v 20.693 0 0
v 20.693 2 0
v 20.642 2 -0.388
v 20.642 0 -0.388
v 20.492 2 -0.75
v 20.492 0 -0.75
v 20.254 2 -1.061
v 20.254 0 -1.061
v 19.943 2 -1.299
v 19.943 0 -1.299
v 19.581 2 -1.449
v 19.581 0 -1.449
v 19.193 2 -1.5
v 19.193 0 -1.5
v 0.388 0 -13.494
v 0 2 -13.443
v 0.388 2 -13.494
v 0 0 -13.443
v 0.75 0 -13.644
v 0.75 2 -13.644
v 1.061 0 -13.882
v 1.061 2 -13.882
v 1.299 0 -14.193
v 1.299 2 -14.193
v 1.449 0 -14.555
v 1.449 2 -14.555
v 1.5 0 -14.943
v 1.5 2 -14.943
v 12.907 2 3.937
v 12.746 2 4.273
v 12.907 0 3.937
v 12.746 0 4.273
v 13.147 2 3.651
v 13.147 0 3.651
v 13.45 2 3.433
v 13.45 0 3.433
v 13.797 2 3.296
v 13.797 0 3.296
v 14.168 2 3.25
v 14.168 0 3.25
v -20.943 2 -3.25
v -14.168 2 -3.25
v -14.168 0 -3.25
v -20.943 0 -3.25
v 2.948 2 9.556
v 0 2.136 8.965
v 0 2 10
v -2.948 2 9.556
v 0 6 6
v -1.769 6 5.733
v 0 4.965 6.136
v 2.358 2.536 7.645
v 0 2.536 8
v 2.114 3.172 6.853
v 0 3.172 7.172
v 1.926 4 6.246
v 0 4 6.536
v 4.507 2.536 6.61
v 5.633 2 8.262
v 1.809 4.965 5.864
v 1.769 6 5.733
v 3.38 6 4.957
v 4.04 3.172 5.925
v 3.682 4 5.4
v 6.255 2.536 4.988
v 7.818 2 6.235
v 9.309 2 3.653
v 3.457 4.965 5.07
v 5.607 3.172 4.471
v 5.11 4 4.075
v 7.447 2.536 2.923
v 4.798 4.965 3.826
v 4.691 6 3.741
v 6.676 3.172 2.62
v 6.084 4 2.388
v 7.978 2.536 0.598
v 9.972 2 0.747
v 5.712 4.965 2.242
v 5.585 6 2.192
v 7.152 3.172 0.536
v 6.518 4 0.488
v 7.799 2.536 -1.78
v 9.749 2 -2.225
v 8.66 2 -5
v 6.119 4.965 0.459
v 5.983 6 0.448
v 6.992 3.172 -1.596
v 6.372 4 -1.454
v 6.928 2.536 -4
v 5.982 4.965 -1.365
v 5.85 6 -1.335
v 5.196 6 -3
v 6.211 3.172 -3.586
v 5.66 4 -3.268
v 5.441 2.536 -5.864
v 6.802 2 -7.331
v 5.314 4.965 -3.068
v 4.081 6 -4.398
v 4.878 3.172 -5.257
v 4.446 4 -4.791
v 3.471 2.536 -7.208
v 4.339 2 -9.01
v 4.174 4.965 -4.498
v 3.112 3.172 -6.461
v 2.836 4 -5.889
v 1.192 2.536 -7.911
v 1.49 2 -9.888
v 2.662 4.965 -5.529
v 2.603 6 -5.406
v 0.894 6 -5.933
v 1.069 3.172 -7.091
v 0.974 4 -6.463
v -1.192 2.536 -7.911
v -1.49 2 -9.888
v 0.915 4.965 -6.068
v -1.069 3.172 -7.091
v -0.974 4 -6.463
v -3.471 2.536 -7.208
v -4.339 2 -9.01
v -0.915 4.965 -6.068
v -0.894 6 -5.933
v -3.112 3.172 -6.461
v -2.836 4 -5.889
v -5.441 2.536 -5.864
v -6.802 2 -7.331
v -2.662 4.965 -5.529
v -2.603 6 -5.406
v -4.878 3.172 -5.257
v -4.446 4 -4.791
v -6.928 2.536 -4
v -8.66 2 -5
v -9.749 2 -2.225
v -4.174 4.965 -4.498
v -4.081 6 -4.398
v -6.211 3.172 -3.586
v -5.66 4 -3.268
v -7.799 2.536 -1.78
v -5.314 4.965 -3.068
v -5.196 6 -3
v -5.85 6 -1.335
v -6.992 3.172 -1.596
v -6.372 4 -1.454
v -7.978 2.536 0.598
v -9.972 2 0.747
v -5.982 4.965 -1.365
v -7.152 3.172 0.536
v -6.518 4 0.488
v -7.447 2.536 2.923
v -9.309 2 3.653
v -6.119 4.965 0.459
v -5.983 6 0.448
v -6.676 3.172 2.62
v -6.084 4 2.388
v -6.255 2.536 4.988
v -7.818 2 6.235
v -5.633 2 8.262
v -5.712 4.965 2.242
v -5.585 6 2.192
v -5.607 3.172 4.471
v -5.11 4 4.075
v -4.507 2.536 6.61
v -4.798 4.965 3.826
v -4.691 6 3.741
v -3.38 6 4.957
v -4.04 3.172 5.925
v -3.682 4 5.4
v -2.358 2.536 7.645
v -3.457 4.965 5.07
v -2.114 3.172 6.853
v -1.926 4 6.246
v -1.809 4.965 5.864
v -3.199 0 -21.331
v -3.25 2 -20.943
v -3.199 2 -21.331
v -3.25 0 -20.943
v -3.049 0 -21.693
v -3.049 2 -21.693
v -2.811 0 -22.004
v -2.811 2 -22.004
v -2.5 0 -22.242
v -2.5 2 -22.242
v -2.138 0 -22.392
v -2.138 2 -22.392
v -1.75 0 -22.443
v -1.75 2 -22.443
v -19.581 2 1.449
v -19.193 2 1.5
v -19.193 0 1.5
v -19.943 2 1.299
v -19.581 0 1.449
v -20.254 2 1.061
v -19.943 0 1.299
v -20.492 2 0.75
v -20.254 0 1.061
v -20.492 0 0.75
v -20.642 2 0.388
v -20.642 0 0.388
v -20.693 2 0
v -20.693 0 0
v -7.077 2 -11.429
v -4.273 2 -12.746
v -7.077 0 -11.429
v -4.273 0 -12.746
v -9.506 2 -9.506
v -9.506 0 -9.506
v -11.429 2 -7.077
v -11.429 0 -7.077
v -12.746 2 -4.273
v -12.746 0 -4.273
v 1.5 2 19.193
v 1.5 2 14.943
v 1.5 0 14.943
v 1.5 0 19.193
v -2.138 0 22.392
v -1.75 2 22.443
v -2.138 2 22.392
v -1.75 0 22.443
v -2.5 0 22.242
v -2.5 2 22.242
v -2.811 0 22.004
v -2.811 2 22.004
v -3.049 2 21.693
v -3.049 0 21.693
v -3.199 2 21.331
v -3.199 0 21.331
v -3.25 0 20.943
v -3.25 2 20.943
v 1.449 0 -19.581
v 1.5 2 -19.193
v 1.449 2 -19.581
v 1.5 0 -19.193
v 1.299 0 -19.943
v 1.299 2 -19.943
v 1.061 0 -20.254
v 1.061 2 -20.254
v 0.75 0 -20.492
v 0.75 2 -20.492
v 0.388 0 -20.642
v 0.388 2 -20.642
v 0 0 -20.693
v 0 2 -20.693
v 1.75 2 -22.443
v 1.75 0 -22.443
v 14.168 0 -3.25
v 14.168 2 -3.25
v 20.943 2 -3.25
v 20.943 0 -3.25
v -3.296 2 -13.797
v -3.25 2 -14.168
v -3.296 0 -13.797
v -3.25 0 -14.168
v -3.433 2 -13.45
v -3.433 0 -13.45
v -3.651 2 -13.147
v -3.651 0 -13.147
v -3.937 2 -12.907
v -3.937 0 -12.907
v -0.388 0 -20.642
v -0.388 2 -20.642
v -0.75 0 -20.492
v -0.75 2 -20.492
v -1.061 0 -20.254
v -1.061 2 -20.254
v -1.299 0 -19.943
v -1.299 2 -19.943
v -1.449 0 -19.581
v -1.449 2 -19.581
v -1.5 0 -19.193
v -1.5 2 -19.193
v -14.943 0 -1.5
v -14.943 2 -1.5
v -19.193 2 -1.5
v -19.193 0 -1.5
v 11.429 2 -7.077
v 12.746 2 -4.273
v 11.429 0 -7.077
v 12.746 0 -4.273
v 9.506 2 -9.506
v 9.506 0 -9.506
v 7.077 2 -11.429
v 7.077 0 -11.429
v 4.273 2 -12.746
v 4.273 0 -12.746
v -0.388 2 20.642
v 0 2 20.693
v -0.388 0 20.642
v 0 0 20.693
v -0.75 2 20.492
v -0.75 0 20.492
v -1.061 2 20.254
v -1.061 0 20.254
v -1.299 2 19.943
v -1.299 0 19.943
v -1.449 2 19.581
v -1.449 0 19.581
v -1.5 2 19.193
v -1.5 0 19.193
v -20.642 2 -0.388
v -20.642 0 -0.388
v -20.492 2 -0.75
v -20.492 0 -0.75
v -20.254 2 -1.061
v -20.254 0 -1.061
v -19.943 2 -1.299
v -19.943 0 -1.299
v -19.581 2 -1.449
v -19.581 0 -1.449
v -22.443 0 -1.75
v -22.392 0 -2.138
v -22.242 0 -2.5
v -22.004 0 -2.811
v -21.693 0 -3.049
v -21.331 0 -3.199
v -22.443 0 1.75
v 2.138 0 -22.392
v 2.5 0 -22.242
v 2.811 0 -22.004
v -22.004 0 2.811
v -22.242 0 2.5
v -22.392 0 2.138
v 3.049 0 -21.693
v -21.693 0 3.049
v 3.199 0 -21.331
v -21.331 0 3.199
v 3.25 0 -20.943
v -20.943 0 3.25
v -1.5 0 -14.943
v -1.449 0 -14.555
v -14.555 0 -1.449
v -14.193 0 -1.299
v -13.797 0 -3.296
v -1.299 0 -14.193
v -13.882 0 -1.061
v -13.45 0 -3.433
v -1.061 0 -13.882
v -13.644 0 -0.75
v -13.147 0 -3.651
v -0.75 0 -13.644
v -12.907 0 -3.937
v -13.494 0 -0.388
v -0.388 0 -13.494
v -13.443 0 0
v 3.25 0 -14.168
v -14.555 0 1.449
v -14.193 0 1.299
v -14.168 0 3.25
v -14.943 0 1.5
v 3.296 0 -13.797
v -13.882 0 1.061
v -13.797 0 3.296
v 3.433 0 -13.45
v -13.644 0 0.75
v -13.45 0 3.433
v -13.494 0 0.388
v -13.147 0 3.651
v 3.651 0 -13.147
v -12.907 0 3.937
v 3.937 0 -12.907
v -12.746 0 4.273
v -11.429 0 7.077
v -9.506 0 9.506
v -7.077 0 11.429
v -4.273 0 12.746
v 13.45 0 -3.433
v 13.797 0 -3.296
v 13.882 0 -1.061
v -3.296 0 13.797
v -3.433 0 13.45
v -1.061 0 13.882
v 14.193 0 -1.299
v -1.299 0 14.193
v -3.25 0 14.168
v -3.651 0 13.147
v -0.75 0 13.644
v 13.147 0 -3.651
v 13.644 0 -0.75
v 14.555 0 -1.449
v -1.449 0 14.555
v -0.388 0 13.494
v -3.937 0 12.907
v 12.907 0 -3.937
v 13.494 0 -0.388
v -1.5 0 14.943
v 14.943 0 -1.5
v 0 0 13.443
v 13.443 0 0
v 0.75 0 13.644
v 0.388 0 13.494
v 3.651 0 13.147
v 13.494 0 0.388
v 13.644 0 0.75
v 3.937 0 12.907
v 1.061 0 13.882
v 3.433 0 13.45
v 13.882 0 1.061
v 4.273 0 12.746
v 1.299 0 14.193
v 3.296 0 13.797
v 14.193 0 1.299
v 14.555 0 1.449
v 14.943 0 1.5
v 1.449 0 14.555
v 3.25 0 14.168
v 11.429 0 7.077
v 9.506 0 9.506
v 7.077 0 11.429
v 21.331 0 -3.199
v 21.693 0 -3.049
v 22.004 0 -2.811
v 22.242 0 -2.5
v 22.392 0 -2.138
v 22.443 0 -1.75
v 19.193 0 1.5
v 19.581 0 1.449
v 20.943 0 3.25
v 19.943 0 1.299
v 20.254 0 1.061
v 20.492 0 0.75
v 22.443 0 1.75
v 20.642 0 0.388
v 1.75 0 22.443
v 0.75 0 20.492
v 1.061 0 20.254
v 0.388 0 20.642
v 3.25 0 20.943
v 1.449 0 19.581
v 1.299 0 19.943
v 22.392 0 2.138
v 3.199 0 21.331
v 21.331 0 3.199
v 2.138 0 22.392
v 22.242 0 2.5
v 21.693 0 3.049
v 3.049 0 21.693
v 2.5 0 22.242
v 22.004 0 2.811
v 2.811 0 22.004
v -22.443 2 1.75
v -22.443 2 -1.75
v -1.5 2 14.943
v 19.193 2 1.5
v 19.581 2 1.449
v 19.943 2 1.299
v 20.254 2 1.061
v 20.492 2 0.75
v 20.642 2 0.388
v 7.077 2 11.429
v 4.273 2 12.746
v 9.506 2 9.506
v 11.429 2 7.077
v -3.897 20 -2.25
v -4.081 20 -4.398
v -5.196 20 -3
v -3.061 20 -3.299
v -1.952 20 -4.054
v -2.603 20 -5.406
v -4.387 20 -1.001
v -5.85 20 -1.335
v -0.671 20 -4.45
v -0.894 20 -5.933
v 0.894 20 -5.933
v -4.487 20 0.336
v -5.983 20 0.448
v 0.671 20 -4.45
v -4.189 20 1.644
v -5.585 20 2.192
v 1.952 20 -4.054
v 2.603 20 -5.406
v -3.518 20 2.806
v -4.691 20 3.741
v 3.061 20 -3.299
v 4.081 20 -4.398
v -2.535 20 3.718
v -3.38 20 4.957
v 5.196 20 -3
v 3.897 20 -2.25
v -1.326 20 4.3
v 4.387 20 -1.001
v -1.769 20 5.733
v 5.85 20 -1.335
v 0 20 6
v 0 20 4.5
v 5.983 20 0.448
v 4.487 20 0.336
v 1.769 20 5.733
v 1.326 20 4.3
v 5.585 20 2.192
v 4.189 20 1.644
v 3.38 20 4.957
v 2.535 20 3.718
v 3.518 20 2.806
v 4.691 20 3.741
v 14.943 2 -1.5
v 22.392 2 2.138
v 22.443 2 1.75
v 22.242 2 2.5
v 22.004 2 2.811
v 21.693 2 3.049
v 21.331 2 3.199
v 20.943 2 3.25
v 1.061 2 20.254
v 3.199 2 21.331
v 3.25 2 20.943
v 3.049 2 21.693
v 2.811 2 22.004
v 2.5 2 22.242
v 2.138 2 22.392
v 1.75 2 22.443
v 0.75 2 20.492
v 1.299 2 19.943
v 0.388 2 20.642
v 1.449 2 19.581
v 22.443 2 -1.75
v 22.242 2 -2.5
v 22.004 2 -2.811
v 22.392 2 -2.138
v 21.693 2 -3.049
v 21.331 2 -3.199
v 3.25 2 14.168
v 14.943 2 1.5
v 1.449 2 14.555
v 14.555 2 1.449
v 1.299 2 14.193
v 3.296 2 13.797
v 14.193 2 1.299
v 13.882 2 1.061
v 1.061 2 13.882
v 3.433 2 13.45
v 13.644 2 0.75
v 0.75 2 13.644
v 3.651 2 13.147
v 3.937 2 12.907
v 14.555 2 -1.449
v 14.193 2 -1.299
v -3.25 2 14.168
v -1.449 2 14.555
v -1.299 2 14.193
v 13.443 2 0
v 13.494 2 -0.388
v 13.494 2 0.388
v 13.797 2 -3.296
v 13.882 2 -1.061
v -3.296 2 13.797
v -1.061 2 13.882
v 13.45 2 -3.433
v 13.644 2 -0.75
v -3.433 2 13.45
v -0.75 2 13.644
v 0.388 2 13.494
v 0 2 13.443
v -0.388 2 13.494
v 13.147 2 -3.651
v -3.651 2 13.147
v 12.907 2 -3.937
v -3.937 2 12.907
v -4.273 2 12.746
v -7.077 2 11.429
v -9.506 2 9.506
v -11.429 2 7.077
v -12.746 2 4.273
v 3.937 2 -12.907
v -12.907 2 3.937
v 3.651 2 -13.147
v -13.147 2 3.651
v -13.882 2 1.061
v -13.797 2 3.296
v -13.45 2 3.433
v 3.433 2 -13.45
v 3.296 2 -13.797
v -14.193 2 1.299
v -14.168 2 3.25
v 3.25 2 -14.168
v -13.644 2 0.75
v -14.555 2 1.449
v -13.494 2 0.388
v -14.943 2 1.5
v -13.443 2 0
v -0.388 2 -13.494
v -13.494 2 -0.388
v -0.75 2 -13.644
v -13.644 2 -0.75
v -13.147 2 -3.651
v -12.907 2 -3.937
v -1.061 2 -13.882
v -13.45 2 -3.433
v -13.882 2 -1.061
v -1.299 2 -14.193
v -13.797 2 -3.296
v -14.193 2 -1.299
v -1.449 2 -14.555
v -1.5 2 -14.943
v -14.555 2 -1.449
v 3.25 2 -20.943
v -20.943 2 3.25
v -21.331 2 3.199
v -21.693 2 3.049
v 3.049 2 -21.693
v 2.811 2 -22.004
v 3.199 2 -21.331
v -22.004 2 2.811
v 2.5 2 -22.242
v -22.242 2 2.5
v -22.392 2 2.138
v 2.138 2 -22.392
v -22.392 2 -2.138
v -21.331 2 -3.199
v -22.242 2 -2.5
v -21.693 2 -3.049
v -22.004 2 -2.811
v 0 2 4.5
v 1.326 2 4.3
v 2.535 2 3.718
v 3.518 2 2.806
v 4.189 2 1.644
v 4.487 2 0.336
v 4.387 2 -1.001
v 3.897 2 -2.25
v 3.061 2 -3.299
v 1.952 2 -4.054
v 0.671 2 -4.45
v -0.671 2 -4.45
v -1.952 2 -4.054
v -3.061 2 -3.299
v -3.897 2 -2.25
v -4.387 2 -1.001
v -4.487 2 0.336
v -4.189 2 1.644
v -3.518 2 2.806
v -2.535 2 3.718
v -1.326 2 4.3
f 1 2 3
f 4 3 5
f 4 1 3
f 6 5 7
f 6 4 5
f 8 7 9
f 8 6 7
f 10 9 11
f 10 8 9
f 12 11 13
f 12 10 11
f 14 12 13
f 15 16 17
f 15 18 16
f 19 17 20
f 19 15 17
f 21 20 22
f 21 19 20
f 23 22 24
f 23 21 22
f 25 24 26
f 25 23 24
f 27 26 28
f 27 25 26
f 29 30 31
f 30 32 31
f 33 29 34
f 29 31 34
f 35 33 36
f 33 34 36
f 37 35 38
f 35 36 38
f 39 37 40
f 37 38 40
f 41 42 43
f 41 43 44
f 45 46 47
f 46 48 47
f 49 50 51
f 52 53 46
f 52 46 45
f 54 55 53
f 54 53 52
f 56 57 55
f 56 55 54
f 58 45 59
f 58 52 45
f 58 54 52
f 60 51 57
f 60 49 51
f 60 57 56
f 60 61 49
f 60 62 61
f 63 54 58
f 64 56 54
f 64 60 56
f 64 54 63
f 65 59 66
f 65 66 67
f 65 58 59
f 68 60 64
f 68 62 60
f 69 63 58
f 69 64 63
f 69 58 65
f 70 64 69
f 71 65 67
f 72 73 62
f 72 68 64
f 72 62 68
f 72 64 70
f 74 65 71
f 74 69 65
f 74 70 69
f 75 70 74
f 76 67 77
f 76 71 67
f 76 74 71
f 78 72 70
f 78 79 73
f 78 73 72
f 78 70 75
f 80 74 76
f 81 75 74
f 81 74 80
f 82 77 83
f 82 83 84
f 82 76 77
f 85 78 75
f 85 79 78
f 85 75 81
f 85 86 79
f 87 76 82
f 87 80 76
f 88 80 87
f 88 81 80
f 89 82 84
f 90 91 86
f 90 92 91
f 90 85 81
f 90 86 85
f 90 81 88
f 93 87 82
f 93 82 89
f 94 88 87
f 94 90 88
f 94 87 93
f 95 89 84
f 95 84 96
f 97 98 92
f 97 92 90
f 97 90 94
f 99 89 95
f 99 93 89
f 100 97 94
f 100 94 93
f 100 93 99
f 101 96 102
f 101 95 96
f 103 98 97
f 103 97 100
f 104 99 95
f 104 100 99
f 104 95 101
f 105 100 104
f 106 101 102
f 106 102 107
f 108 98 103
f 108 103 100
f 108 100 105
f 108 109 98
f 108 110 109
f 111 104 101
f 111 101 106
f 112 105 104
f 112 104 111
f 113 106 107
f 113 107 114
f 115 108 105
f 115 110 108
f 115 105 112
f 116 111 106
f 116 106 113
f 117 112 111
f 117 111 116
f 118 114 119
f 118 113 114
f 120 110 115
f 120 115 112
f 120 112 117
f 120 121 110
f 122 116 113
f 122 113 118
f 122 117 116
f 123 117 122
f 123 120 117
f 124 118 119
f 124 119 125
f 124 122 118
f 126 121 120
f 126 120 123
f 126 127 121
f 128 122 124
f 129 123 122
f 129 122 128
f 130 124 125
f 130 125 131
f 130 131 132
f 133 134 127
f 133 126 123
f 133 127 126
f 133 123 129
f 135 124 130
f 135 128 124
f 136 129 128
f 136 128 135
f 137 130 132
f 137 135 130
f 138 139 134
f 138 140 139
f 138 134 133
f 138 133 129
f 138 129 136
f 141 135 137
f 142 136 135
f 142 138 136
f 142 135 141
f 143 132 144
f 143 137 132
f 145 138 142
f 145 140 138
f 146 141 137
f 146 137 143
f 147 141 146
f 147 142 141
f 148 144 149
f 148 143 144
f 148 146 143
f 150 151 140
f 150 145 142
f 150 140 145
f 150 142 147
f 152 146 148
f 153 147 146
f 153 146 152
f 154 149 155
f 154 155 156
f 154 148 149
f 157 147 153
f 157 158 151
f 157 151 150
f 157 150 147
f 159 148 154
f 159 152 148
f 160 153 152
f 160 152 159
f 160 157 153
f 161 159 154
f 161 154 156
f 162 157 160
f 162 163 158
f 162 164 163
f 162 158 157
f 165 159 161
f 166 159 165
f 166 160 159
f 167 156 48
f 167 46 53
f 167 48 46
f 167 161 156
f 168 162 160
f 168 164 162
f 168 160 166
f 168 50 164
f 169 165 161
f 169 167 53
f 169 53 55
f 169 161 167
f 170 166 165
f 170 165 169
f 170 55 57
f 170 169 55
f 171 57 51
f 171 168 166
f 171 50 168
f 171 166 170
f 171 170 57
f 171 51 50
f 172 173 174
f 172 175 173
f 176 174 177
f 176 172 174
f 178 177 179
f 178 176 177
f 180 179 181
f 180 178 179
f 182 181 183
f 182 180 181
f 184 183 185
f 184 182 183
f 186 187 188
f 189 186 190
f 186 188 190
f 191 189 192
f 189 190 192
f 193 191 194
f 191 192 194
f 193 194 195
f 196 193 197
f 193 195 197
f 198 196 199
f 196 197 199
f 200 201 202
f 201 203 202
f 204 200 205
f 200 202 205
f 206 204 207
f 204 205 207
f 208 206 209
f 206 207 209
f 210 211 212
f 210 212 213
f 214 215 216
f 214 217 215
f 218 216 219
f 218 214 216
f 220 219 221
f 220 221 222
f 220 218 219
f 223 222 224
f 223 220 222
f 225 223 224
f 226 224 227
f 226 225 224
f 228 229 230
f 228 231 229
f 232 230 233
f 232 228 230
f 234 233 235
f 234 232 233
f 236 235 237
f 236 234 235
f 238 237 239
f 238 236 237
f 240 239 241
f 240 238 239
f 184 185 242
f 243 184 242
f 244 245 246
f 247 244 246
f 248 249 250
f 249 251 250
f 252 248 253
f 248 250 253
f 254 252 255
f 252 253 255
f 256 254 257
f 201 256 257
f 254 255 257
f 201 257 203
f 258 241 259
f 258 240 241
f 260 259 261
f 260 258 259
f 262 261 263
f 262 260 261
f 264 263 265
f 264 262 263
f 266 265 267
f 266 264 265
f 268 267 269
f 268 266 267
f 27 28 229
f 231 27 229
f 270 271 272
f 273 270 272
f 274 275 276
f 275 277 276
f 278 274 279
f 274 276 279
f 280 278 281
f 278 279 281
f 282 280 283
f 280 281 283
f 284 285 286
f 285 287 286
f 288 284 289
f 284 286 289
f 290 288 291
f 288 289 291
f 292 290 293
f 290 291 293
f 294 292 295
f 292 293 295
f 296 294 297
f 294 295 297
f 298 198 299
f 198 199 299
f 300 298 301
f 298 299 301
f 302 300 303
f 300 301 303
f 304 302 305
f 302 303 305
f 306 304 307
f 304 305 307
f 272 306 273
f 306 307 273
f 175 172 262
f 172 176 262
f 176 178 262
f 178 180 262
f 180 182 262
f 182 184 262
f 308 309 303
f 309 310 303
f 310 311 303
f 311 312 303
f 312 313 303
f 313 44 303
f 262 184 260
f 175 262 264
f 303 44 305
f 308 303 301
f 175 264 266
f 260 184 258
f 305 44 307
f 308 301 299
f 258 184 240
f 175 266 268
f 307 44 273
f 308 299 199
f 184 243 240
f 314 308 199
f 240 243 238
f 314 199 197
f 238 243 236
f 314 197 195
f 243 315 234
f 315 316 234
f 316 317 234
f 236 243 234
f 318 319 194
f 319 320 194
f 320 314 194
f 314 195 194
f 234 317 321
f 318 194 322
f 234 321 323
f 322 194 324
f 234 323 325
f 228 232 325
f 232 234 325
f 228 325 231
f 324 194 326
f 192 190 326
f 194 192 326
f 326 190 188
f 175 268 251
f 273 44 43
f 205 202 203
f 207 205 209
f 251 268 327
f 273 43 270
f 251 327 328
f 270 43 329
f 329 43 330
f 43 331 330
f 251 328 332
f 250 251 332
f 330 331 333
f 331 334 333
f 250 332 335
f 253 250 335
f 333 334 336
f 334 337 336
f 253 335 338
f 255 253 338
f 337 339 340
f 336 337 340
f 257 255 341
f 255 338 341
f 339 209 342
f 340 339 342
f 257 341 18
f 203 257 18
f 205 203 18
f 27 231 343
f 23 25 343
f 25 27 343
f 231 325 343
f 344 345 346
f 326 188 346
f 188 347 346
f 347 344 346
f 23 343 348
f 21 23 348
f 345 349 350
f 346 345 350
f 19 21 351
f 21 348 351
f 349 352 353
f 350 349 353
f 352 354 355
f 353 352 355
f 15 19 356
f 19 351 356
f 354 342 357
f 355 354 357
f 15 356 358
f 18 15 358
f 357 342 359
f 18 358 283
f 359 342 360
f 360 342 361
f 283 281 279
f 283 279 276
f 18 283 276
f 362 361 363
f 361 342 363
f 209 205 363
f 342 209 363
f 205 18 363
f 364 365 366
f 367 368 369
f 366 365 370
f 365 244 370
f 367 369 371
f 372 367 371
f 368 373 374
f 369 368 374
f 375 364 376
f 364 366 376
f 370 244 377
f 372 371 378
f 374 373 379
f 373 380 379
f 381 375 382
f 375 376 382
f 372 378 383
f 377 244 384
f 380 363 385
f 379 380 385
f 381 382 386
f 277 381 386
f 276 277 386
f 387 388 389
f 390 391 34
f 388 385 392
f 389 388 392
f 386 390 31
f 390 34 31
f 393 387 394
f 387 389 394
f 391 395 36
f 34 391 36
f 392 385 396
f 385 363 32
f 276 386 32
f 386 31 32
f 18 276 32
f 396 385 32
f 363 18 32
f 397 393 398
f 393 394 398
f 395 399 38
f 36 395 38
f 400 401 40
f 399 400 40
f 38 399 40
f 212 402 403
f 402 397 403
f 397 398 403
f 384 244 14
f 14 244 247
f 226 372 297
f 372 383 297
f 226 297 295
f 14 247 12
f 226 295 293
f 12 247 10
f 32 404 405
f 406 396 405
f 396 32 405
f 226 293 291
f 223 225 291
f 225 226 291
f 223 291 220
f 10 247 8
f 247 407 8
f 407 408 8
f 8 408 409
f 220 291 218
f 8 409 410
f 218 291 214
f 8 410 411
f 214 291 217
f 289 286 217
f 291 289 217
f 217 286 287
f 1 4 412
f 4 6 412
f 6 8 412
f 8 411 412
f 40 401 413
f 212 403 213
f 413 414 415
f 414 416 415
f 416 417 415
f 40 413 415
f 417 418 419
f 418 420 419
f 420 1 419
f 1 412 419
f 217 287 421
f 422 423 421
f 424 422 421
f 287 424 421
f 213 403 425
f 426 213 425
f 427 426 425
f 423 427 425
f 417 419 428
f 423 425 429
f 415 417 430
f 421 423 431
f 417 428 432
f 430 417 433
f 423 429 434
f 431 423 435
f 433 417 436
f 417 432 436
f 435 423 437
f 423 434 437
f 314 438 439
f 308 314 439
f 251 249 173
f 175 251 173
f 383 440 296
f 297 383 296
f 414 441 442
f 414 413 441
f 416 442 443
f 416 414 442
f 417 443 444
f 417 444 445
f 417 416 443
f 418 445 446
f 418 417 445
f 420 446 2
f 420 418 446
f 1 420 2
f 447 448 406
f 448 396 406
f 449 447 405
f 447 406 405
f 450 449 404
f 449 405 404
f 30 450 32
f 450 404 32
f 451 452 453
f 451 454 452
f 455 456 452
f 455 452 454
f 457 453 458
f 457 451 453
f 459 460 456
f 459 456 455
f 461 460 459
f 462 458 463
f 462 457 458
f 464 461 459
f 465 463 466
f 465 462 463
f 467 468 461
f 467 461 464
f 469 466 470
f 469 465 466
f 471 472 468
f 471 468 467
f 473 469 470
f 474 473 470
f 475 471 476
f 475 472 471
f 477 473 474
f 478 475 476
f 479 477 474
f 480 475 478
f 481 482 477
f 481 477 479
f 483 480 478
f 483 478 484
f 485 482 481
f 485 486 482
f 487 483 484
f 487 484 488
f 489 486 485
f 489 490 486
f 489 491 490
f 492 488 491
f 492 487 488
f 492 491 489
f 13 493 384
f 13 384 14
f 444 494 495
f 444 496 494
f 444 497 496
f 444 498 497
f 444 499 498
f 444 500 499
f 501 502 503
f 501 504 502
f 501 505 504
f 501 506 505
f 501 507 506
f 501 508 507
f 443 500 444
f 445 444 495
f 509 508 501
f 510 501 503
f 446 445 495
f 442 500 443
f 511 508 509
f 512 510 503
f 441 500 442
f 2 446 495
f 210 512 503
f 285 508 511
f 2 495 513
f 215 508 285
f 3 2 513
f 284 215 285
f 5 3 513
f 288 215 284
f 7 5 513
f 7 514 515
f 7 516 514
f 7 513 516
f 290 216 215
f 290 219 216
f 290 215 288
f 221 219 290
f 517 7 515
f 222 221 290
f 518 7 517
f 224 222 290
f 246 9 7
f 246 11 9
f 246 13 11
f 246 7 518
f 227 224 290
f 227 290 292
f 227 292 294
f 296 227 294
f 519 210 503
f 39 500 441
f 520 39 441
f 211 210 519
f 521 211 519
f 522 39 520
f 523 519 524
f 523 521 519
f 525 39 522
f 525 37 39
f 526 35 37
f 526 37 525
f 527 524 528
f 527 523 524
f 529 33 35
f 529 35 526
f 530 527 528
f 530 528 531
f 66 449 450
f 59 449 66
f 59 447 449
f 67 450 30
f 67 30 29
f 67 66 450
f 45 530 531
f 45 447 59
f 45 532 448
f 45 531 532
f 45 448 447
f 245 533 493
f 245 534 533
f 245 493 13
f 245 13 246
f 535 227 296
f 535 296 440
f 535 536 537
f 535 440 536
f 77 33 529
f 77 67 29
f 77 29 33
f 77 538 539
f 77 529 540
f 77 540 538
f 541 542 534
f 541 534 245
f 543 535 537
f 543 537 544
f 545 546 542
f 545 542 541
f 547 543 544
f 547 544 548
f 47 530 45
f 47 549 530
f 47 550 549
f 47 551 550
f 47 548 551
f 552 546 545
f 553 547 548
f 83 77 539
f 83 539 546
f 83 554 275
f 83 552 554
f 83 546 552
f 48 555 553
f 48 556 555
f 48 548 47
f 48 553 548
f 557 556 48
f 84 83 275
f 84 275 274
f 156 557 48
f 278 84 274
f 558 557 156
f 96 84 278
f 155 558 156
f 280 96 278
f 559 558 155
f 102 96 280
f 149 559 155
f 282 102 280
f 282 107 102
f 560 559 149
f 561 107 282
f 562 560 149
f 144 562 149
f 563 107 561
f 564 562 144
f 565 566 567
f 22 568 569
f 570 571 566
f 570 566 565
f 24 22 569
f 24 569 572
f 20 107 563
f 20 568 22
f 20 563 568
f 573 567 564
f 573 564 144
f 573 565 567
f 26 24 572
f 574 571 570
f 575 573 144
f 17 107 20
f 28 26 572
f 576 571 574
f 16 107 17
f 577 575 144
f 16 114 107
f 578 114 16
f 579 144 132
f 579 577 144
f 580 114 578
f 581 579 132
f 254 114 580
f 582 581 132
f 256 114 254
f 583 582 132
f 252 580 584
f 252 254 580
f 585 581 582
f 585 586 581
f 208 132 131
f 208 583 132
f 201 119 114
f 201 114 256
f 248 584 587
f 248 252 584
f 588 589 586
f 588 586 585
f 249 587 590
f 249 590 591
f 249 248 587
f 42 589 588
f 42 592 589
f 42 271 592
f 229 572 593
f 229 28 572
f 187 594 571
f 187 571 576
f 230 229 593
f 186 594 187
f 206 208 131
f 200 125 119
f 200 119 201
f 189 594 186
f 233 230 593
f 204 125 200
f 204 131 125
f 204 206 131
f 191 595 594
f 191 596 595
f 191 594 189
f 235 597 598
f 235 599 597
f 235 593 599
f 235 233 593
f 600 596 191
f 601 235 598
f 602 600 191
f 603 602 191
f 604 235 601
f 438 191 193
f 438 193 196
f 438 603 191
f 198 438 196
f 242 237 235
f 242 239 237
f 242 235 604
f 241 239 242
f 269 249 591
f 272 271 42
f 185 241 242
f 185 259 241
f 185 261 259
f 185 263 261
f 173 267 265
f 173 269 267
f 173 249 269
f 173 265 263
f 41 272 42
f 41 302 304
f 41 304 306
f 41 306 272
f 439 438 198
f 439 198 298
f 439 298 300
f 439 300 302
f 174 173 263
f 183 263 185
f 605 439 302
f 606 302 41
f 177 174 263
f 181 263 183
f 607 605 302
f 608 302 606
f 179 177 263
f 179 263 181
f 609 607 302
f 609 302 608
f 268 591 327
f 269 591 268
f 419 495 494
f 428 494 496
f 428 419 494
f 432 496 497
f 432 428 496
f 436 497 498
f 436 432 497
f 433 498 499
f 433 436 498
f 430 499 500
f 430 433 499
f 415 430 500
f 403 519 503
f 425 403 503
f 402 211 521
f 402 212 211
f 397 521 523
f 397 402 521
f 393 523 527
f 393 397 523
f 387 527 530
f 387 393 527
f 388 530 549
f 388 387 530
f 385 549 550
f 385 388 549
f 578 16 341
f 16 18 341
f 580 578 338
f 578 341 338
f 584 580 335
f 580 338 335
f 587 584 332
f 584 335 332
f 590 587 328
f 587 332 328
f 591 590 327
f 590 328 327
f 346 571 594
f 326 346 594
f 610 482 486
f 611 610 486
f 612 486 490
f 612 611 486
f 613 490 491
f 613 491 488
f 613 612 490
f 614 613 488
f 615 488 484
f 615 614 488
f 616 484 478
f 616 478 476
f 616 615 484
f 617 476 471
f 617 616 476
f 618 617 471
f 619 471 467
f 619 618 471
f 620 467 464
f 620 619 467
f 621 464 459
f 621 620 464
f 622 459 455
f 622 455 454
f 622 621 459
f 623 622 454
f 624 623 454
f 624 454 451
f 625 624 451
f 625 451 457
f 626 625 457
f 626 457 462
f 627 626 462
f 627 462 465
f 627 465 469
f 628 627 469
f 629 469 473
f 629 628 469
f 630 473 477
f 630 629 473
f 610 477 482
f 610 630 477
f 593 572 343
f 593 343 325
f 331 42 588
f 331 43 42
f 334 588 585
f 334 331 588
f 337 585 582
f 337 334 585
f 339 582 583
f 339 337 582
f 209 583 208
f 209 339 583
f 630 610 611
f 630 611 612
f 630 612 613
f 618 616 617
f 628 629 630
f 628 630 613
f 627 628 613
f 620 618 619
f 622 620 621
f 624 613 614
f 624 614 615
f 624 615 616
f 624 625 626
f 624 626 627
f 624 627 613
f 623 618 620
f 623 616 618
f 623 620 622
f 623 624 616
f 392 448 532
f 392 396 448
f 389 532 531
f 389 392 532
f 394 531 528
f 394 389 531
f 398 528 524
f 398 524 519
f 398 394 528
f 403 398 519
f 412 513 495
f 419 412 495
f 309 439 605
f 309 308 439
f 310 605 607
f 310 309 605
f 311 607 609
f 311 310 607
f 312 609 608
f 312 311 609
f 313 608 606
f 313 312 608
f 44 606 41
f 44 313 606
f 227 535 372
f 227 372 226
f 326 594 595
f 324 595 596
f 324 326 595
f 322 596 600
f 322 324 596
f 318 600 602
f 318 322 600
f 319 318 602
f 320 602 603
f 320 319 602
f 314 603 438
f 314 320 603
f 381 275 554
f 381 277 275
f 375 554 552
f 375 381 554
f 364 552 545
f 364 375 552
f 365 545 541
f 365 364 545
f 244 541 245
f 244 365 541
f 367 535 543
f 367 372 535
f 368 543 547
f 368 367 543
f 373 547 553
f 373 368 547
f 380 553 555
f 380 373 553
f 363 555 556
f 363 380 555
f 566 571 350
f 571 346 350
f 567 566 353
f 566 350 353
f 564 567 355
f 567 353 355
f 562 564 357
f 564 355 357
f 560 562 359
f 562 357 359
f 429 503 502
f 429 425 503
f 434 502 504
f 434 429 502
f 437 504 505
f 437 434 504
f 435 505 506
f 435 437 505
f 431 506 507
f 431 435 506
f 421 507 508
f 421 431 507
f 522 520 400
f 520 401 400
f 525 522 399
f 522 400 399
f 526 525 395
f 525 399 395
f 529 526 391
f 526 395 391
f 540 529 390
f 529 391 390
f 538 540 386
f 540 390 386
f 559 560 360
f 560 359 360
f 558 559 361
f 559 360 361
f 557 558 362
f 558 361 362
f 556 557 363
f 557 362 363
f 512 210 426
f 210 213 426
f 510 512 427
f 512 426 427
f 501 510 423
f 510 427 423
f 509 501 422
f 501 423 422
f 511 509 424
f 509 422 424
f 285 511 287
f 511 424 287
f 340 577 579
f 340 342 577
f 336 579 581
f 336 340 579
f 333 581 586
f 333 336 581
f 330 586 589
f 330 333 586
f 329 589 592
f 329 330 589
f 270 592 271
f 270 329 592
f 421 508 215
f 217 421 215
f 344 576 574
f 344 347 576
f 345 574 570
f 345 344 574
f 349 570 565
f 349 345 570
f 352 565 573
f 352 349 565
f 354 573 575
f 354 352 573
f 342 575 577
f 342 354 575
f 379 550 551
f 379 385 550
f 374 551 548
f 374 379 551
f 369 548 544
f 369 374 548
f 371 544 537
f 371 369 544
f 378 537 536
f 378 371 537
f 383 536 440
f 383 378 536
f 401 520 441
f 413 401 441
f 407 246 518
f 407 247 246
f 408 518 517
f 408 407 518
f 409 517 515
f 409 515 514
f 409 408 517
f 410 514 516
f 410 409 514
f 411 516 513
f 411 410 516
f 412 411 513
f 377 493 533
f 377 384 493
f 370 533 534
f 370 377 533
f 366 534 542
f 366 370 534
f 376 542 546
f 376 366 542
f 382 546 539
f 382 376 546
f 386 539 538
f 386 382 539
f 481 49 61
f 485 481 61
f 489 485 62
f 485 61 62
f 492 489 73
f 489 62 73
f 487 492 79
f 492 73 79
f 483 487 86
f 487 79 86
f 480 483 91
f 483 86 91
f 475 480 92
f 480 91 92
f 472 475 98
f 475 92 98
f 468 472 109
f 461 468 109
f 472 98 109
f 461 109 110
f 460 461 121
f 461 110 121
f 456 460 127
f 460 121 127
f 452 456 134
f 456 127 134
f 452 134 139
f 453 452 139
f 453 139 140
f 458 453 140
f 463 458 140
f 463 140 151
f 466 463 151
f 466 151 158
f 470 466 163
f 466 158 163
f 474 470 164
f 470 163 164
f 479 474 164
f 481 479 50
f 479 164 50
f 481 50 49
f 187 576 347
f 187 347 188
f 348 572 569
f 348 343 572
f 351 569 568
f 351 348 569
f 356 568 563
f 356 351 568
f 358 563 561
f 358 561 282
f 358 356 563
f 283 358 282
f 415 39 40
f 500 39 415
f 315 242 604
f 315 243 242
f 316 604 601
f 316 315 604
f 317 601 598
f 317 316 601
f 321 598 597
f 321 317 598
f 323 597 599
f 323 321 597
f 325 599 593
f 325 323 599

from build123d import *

# Parameters (mm, degrees)
SKETCH1_R                = 13.442813203
BOSS_EXTRUDE1_DEPTH      = 2
SKETCH2_W                = 6.5
SKETCH2_H                = 18
SKETCH2_W_2              = 3
SKETCH2_H_2              = 14.5
BOSS_EXTRUDE3_DEPTH      = 2
FILLET1_R                = 1.5
CIRPATTERN1_COUNT        = 4
FILLET1_OF_CIRPATTERN1_R = 1.5
SKETCH3_R                = 6
SKETCH3_R_2              = 4.5
BOSS_EXTRUDE4_DEPTH      = 18
FILLET2_R                = 4


with BuildPart() as part:
    # Sketch1 → Boss-Extrude1 (new body)
    with BuildSketch(Plane(origin=(0, 0, 0), x_dir=(1, 0, 0), z_dir=(0, 1, 0))):
        with Locations(Location((0, 0, 0), (0, 0, 270))):
            Circle(SKETCH1_R)
    extrude(amount=BOSS_EXTRUDE1_DEPTH)

    # Sketch2 → Boss-Extrude3 (add)
    with BuildSketch(Plane(origin=(0, 2, 0), x_dir=(1, 0, 0), z_dir=(0, 1, 0))):
        with Locations((0, 13.442813203)):
            Rectangle(SKETCH2_W, SKETCH2_H)
        with Locations((0, 13.442813203)):
            Rectangle(SKETCH2_W_2, SKETCH2_H_2, mode=Mode.SUBTRACT)
    boss_extrude3 = extrude(amount=-BOSS_EXTRUDE3_DEPTH)

    # Fillet1
    fillet1_edges = [part.edges().sort_by_distance(p)[0] for p in [
        (3.25, 1, -13.044030313),
        (3.25, 1, -22.442813203),
        (-3.25, 1, -22.442813203),
        (-3.25, 1, -13.044030313),
        (-1.5, 1, -13.35886323),
        (1.5, 1, -13.35886323),
        (1.5, 1, -20.692813203),
        (-1.5, 1, -20.692813203),
    ]]
    fillet(fillet1_edges, radius=FILLET1_R - 0.0001)  # a hair under: the kernel refuses the full size

    # CirPattern1: Boss-Extrude3 ×4 about axis
    cirpattern1_axis = Axis((0, 0, 0), (0, 1, 0))
    for i in range(1, CIRPATTERN1_COUNT):
        add(boss_extrude3.rotate(cirpattern1_axis, i * 360 / CIRPATTERN1_COUNT))

    # Fillet1 of CirPattern1
    fillet1_of_cirpattern1_edges = [part.edges().sort_by_distance(p)[0] for p in [
        (-13.044030313, 1, -3.25),
        (-22.442813203, 1, -3.25),
        (-22.442813203, 1, 3.25),
        (-13.044030313, 1, 3.25),
        (-13.35886323, 1, 1.5),
        (-13.35886323, 1, -1.5),
        (-20.692813203, 1, -1.5),
        (-20.692813203, 1, 1.5),
        (-3.25, 1, 13.044030313),
        (-3.25, 1, 22.442813203),
        (3.25, 1, 22.442813203),
        (3.25, 1, 13.044030313),
        (1.5, 1, 13.35886323),
        (-1.5, 1, 13.35886323),
        (-1.5, 1, 20.692813203),
        (1.5, 1, 20.692813203),
        (13.044030313, 1, 3.25),
        (22.442813203, 1, 3.25),
        (22.442813203, 1, -3.25),
        (13.044030313, 1, -3.25),
        (13.35886323, 1, -1.5),
        (13.35886323, 1, 1.5),
        (20.692813203, 1, 1.5),
        (20.692813203, 1, -1.5),
    ]]
    fillet(fillet1_of_cirpattern1_edges, radius=FILLET1_OF_CIRPATTERN1_R - 0.0001)  # a hair under: the kernel refuses the full size

    # Sketch3 → Boss-Extrude4 (add)
    with BuildSketch(Plane(origin=(0, 2, 0), x_dir=(1, 0, 0), z_dir=(0, 1, 0))):
        with Locations(Location((0, 0, 0), (0, 0, 270))):
            Circle(SKETCH3_R)
        with Locations(Location((0, 0, 0), (0, 0, 270))):
            Circle(SKETCH3_R_2, mode=Mode.SUBTRACT)
    extrude(amount=BOSS_EXTRUDE4_DEPTH)

    # Fillet2
    fillet2_edges = [part.edges().sort_by_distance(p)[0] for p in [
        (0, 2, -6),
    ]]
    fillet(fillet2_edges, radius=FILLET2_R)


solid = part.part
